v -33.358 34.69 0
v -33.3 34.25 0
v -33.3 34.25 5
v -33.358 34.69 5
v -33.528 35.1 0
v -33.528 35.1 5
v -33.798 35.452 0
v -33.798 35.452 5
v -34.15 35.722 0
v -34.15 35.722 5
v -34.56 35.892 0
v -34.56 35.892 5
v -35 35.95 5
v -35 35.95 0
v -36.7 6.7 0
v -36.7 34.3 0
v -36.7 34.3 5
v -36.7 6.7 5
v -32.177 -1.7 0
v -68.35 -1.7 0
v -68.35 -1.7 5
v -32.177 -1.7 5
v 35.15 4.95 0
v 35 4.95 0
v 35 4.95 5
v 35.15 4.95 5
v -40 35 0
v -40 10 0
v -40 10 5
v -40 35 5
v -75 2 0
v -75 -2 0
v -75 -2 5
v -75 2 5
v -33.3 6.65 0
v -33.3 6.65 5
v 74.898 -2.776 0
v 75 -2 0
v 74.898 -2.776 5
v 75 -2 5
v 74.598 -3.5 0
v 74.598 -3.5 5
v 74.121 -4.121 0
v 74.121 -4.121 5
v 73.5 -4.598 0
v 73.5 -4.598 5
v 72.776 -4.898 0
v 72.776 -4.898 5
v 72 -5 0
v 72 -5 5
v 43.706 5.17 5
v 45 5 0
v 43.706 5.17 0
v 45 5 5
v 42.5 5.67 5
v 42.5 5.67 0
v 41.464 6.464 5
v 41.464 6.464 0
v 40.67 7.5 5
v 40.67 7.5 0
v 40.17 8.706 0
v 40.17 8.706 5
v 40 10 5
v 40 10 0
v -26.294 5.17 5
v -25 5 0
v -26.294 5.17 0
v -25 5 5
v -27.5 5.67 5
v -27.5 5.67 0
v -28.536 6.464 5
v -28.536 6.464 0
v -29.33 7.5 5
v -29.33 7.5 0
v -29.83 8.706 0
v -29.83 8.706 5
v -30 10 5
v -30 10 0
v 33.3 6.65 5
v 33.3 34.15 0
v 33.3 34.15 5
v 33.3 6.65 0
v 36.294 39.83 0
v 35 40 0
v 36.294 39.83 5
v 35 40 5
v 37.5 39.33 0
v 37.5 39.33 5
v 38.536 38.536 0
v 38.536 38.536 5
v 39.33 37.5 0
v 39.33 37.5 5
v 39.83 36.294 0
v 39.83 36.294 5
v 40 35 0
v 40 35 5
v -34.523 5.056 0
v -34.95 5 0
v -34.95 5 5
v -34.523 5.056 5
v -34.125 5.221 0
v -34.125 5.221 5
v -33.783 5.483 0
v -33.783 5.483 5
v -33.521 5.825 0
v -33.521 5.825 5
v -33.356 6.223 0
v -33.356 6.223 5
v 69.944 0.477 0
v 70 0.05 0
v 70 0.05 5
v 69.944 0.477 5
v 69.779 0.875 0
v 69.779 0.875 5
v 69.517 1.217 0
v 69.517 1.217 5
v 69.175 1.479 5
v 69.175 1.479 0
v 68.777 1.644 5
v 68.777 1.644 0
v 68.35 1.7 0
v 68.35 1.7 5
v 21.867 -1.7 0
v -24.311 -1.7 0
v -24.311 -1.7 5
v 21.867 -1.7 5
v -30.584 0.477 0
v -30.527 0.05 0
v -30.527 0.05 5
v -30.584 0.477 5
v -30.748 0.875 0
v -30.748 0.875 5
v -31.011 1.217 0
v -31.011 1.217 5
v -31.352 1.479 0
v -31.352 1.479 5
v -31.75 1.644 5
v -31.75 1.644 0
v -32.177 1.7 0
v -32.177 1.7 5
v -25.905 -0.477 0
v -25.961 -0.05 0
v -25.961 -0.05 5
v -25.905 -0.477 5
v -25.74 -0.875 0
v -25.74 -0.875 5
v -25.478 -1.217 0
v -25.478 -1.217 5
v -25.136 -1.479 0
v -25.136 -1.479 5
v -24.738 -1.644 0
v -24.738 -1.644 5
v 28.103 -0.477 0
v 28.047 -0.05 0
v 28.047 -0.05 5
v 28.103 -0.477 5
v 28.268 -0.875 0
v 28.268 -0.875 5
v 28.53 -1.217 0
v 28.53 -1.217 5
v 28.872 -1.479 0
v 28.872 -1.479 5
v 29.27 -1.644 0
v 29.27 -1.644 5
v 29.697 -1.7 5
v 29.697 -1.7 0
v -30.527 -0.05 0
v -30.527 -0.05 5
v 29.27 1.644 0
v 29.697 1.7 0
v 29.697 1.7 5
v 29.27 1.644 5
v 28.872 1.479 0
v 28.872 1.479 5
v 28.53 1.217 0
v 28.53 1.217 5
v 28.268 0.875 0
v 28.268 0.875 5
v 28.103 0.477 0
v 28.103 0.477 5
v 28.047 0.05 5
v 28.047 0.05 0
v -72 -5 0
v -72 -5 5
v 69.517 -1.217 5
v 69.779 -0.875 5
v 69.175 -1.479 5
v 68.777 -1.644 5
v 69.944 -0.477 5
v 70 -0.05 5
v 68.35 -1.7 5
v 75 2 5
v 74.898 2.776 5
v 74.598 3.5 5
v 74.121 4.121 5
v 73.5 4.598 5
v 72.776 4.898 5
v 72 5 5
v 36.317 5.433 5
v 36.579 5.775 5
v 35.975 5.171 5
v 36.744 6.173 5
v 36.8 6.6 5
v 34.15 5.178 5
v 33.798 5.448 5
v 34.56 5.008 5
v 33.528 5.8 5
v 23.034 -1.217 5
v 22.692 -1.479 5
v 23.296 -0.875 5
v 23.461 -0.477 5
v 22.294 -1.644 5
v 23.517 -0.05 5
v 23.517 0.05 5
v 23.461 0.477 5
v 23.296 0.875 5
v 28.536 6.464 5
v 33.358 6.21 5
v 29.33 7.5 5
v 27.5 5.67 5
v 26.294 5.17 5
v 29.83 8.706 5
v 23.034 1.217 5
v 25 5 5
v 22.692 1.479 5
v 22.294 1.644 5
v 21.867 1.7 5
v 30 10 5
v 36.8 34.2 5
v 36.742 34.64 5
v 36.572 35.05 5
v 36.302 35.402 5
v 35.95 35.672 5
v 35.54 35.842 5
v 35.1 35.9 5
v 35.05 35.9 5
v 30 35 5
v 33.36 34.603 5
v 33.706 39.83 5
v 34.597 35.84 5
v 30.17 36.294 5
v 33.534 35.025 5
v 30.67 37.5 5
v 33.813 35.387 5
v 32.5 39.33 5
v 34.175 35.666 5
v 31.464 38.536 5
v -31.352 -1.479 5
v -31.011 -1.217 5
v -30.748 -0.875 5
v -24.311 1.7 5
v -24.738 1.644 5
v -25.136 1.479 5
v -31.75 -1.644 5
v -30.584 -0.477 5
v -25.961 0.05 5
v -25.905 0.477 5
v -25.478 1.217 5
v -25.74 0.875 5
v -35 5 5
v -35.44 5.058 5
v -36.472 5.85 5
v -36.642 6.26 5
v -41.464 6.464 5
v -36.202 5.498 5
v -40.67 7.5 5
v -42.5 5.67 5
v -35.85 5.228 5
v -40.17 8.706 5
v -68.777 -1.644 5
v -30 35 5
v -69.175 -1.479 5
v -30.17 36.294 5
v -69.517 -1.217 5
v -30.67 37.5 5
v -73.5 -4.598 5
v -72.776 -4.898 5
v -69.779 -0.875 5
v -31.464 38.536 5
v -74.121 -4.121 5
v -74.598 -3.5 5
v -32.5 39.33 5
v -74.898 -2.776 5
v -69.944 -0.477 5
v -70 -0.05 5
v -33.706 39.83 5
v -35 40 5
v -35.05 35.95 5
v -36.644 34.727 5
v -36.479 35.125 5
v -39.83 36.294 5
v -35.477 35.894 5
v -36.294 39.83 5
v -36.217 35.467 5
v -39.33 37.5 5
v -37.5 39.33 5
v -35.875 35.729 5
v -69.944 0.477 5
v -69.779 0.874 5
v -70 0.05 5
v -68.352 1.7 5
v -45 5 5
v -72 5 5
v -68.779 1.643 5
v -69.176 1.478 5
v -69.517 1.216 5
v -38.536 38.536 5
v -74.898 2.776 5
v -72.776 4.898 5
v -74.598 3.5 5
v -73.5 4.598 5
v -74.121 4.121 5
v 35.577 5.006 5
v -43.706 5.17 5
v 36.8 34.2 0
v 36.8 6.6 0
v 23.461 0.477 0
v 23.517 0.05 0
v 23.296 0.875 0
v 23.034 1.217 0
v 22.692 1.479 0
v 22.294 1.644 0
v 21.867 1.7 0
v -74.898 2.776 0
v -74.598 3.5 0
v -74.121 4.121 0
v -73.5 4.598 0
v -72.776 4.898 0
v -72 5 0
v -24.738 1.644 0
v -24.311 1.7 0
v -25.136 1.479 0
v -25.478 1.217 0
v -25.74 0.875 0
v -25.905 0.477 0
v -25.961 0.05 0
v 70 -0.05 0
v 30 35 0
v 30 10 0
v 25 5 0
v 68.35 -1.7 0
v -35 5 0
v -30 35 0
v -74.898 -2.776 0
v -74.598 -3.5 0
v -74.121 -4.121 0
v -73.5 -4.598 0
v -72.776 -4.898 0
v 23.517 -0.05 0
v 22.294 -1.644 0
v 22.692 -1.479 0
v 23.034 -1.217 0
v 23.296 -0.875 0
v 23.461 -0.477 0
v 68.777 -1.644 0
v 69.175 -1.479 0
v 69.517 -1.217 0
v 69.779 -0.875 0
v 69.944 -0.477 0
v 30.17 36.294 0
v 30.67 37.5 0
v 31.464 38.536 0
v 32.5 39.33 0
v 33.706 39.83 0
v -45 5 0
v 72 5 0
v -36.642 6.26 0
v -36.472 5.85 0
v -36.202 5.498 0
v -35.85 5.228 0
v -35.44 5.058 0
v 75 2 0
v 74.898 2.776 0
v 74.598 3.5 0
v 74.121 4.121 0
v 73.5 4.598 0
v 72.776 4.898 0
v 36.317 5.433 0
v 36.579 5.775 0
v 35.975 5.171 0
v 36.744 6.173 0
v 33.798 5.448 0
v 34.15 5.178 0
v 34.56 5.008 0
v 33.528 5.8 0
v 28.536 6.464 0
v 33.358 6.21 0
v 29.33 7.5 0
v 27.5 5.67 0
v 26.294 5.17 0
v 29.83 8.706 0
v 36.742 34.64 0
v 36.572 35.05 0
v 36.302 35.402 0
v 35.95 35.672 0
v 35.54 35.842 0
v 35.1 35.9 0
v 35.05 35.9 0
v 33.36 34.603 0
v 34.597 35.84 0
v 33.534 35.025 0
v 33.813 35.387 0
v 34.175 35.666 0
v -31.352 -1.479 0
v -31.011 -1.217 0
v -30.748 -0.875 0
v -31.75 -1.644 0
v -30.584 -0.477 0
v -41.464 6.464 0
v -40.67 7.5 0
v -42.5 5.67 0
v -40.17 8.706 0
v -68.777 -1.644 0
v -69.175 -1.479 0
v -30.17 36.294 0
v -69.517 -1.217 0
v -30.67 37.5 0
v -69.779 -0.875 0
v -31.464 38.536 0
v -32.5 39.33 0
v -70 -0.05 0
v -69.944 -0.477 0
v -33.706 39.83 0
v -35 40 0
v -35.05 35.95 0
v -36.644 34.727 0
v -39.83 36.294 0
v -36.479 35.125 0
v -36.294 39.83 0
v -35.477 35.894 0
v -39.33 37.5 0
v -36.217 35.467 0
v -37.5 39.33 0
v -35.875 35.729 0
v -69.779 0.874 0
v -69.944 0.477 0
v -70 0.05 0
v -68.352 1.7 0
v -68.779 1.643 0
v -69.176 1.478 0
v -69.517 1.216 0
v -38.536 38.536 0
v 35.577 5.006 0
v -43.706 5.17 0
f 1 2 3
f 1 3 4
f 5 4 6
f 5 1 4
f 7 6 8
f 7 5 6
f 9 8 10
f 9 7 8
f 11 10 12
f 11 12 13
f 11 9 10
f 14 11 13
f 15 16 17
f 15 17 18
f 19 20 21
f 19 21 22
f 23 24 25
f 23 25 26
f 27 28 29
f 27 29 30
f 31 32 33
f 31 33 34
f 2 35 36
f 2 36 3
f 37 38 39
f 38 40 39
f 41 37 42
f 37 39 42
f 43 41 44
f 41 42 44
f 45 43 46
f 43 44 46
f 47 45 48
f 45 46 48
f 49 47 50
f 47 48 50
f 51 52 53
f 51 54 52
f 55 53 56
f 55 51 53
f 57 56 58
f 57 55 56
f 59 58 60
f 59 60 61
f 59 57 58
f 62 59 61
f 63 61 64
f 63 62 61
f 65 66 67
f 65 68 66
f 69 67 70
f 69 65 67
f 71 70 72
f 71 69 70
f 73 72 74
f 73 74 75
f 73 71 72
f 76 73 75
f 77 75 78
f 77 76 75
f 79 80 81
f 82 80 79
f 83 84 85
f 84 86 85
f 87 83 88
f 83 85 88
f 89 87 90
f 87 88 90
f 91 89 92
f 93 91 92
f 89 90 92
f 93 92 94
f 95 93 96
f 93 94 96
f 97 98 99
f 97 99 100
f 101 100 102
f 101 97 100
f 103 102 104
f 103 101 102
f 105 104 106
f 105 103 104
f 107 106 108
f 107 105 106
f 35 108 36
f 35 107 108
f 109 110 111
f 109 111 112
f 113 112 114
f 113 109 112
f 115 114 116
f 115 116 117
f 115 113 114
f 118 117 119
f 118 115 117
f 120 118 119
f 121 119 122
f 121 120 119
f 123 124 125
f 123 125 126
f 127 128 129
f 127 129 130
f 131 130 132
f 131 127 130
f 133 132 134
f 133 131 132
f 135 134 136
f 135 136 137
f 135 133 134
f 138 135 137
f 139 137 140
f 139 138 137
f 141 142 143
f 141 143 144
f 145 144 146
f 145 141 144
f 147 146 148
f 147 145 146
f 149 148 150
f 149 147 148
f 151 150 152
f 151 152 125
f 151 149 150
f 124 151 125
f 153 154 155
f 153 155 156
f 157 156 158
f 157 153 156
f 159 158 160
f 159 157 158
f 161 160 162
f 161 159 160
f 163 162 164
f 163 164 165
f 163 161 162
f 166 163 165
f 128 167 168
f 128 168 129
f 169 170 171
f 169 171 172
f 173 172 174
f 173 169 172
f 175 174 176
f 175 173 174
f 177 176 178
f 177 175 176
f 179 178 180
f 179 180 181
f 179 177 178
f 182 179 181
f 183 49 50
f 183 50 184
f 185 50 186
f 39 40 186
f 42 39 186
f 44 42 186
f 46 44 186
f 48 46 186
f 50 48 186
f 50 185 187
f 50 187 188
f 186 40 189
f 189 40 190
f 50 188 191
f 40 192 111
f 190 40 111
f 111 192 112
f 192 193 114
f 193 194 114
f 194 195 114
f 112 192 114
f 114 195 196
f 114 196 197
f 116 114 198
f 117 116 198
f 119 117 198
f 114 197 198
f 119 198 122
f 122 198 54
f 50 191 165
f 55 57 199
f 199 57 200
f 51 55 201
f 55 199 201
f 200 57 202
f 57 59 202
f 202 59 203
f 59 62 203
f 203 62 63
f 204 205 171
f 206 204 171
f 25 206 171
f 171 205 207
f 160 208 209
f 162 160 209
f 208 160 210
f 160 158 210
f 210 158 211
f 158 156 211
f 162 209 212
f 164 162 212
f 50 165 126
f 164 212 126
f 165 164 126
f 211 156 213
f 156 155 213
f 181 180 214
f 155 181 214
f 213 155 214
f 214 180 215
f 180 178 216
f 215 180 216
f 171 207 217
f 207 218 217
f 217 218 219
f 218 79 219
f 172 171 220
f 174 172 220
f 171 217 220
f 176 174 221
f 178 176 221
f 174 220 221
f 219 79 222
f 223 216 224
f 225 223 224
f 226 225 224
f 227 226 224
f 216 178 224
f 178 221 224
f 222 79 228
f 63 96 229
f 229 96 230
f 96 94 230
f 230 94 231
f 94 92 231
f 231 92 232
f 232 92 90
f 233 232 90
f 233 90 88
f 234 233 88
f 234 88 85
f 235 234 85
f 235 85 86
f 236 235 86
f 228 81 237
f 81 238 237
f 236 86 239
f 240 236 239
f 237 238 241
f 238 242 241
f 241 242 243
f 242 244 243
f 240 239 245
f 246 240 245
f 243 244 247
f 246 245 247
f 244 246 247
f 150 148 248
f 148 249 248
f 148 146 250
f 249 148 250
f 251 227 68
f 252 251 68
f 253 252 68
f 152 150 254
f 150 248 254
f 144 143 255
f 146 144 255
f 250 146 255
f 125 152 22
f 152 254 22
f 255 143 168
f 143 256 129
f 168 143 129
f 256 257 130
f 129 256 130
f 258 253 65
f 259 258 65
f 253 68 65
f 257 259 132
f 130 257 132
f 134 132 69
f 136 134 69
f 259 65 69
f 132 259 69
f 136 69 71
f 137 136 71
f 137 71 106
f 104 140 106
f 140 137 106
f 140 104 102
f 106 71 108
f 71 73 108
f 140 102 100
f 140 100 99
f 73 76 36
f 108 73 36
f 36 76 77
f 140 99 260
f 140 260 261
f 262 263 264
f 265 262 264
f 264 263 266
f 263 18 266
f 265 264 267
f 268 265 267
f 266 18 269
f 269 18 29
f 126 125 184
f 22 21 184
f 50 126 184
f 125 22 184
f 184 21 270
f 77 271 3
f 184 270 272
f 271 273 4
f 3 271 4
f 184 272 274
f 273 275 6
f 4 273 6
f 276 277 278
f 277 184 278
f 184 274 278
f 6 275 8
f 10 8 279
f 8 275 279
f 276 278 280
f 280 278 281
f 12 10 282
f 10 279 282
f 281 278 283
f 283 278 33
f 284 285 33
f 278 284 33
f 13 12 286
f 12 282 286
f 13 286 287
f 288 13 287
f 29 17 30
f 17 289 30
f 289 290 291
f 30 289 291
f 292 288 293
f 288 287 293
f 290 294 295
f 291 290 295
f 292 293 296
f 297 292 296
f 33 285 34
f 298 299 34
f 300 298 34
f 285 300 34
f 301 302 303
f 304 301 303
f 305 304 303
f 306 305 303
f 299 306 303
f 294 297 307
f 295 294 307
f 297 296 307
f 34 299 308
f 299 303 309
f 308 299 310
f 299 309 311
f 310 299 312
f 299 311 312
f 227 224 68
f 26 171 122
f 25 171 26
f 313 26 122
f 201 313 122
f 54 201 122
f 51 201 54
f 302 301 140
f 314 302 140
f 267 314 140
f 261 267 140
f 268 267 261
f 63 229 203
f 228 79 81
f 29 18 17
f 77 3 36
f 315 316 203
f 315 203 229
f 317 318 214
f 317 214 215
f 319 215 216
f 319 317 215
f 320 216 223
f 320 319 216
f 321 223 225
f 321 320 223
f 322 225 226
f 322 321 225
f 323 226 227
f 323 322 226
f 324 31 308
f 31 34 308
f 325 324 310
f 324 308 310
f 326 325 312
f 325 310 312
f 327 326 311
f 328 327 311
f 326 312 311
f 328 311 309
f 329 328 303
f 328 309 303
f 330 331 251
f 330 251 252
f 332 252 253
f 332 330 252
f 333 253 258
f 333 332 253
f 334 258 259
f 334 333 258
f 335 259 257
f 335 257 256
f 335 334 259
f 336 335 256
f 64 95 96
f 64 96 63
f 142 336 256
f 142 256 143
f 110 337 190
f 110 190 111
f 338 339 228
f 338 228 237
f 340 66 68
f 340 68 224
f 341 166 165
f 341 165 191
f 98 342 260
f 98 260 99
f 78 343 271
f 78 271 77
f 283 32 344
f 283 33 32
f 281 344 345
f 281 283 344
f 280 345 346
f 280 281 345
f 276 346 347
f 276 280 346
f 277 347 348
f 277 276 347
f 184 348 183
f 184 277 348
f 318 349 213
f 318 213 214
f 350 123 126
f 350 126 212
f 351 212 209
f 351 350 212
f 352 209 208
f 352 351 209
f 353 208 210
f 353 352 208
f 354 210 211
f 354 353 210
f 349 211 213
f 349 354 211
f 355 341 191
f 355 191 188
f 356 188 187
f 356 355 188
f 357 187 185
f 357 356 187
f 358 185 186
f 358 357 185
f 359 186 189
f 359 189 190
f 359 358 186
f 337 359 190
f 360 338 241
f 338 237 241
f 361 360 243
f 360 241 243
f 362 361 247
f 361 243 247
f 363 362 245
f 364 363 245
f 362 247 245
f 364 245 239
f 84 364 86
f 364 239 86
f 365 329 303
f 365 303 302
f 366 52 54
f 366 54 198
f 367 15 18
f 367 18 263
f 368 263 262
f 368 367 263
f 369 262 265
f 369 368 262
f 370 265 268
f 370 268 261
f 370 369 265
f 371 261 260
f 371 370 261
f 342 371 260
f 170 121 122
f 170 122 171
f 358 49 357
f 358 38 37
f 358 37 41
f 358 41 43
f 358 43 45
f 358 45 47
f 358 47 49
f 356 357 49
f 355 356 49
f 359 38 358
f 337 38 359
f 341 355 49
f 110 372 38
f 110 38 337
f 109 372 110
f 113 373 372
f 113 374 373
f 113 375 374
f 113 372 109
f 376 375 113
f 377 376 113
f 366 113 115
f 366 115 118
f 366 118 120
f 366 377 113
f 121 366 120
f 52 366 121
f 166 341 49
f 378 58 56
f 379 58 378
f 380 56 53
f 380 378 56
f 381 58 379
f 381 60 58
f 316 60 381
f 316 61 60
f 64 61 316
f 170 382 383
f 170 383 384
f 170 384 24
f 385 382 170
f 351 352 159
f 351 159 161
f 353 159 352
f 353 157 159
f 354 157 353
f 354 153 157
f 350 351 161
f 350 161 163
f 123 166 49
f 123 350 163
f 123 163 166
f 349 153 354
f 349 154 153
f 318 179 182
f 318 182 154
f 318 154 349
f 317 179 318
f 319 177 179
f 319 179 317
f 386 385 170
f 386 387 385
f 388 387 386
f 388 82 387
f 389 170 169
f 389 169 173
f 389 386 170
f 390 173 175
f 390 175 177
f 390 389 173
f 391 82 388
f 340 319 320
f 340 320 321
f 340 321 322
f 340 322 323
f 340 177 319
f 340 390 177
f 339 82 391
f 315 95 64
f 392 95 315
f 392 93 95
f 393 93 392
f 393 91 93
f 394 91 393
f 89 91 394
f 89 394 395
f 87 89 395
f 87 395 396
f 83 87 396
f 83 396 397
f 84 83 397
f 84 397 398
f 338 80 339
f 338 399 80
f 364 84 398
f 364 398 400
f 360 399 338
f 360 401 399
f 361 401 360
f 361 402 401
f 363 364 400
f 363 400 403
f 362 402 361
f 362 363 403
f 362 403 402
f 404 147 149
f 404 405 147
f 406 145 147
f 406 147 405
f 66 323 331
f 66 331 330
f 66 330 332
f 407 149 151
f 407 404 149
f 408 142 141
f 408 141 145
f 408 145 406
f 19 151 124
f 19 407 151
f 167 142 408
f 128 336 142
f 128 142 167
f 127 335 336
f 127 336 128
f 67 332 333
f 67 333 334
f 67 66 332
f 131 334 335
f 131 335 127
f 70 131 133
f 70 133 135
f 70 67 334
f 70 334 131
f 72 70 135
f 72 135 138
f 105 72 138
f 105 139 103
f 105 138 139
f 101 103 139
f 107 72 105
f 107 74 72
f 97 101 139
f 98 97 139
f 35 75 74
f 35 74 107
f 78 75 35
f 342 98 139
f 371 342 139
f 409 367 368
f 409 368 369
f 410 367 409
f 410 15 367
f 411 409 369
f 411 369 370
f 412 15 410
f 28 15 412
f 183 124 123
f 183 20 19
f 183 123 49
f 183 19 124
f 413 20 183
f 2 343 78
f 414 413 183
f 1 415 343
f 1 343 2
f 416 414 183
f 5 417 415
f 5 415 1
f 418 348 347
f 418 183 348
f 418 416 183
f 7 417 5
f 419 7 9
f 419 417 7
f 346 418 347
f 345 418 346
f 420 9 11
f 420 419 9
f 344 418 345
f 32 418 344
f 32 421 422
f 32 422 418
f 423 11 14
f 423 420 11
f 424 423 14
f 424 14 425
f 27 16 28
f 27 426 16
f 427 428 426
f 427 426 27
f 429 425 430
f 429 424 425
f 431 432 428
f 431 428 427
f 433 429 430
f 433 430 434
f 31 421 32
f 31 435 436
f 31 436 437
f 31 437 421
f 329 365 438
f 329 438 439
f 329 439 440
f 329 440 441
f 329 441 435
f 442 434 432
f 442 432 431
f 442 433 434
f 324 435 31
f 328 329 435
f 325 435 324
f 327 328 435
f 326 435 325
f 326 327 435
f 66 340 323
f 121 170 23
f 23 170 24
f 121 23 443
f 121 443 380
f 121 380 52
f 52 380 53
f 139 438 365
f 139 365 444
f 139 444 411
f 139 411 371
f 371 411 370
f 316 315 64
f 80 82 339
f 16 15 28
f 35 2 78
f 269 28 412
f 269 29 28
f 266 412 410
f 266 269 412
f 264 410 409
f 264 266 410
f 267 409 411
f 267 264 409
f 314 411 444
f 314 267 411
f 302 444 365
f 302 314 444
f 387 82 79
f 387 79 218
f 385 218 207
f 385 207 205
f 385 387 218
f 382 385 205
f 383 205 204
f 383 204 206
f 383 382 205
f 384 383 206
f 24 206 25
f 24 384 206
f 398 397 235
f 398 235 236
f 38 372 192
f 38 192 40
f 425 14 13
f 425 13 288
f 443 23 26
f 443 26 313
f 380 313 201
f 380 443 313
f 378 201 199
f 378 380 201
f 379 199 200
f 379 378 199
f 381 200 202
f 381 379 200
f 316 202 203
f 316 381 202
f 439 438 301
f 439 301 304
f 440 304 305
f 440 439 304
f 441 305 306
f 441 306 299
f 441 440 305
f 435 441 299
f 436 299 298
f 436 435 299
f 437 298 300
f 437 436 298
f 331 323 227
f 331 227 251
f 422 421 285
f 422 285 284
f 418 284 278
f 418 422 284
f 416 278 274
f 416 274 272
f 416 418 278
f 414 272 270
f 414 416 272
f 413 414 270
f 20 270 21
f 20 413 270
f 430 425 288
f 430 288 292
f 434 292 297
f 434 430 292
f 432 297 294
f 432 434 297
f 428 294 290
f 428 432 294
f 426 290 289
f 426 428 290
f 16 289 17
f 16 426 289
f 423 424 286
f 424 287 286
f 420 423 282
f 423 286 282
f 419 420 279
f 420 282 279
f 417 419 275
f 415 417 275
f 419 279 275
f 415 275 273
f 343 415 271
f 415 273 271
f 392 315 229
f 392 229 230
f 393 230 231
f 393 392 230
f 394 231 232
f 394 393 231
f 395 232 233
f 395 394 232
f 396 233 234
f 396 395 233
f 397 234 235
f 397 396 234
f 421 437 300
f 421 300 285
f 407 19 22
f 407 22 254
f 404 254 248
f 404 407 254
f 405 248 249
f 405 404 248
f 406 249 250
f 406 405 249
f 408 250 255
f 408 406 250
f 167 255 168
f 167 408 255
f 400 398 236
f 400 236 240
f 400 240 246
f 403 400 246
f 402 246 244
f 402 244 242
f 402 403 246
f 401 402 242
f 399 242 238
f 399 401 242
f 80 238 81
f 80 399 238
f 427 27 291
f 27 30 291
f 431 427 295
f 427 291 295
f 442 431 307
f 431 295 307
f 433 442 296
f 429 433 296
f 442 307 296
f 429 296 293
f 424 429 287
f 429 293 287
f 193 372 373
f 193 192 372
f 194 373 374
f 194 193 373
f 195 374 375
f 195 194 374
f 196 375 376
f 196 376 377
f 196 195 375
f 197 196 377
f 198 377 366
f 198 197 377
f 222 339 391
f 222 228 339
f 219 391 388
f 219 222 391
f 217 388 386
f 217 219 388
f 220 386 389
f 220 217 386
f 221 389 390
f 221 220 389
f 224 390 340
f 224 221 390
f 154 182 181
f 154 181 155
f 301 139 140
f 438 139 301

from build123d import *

# Parameters (mm, degrees)
EXTRUDE_1_DEPTH     = 5
FILLET_4_R          = 5
FILLET_5_R          = 5
FILLET_6_R          = 5
FILLET_7_R          = 5
FILLET_8_R          = 3
FILLET_9_R          = 3
FILLET_10_R         = 3
FILLET_11_R         = 3
FILLET_12_R         = 5
FILLET_13_R         = 5
FILLET_14_R         = 5
FILLET_15_R         = 5
CUT_EXTRUDE_START   = -5
CUT_EXTRUDE_2_DEPTH = 5


# Read off the part's stored shape, not the designer's step: 切除-拉伸2
with BuildPart() as part:
    # 草图1 → 凸台-拉伸1 (new body)
    with BuildSketch(Plane.XY):
        Polygon((-75, 5), (-40, 5), (-40, 40), (-30, 40), (-30, 5), (30, 5), (30, 40), (40, 40), (40, 5), (75, 5), (75, -5), (-75, -5), align=None)
    extrude(amount=EXTRUDE_1_DEPTH)

    # 圆角4
    fillet_4_edges = [part.edges().sort_by_distance(p)[0] for p in [
        (-40, 40, 2.5),
    ]]
    fillet(fillet_4_edges, radius=FILLET_4_R)

    # 圆角5
    fillet_5_edges = [part.edges().sort_by_distance(p)[0] for p in [
        (-30, 40, 2.5),
    ]]
    fillet(fillet_5_edges, radius=FILLET_5_R - 0.0001)  # a hair under: the kernel refuses the full size

    # 圆角6
    fillet_6_edges = [part.edges().sort_by_distance(p)[0] for p in [
        (30, 40, 2.5),
    ]]
    fillet(fillet_6_edges, radius=FILLET_6_R)

    # 圆角7
    fillet_7_edges = [part.edges().sort_by_distance(p)[0] for p in [
        (40, 40, 2.5),
    ]]
    fillet(fillet_7_edges, radius=FILLET_7_R - 0.0001)  # a hair under: the kernel refuses the full size

    # 圆角8
    fillet_8_edges = [part.edges().sort_by_distance(p)[0] for p in [
        (-75, 5, 2.5),
    ]]
    fillet(fillet_8_edges, radius=FILLET_8_R)

    # 圆角9
    fillet_9_edges = [part.edges().sort_by_distance(p)[0] for p in [
        (-75, -5, 2.5),
    ]]
    fillet(fillet_9_edges, radius=FILLET_9_R)

    # 圆角10
    fillet_10_edges = [part.edges().sort_by_distance(p)[0] for p in [
        (75, 5, 2.5),
    ]]
    fillet(fillet_10_edges, radius=FILLET_10_R)

    # 圆角11
    fillet_11_edges = [part.edges().sort_by_distance(p)[0] for p in [
        (75, -5, 2.5),
    ]]
    fillet(fillet_11_edges, radius=FILLET_11_R)

    # 圆角12
    fillet_12_edges = [part.edges().sort_by_distance(p)[0] for p in [
        (40, 5, 2.5),
    ]]
    fillet(fillet_12_edges, radius=FILLET_12_R)

    # 圆角13
    fillet_13_edges = [part.edges().sort_by_distance(p)[0] for p in [
        (30, 5, 2.5),
    ]]
    fillet(fillet_13_edges, radius=FILLET_13_R)

    # 圆角14
    fillet_14_edges = [part.edges().sort_by_distance(p)[0] for p in [
        (-30, 5, 2.5),
    ]]
    fillet(fillet_14_edges, radius=FILLET_14_R)

    # 圆角15
    fillet_15_edges = [part.edges().sort_by_distance(p)[0] for p in [
        (-40, 5, 2.5),
    ]]
    fillet(fillet_15_edges, radius=FILLET_15_R)

    # 切除-拉伸2 outline → 切除-拉伸2 (cut)
    with BuildSketch(Plane.XY.offset(5).offset(CUT_EXTRUDE_START)):
        with BuildLine():
            ThreePointArc((-36.7, 6.7), (-36.202081528, 5.497918472), (-35, 5))
            Line((-35, 5), (-34.95, 5))
            ThreePointArc((-34.95, 5), (-33.783273811, 5.483273811), (-33.3, 6.65))
            Line((-33.3, 6.65), (-33.3, 34.25))
            ThreePointArc((-33.3, 34.25), (-33.797918472, 35.452081528), (-35, 35.95))
            Line((-35, 35.95), (-35.05, 35.95))
            ThreePointArc((-35.05, 35.95), (-36.216726189, 35.466726189), (-36.7, 34.3))
            Line((-36.7, 34.3), (-36.7, 6.7))
        make_face()
        with BuildLine():
            Line((-30.527301477, -0.05), (-30.527301477, 0.05))
            ThreePointArc((-30.527301477, 0.05), (-31.010575288, 1.216726189), (-32.177301477, 1.7))
            Line((-32.177301477, 1.7), (-68.351867054, 1.699998944))
            ThreePointArc((-68.351867054, 1.699998944), (-69.517386106, 1.216065899), (-70, 0.05))
            Line((-70, 0.05), (-70, -0.05))
            ThreePointArc((-70, -0.05), (-69.516726189, -1.216726189), (-68.35, -1.7))
            Line((-68.35, -1.7), (-32.177301477, -1.7))
            ThreePointArc((-32.177301477, -1.7), (-31.010575288, -1.216726189), (-30.527301477, -0.05))
        make_face()
        with BuildLine():
            Line((-24.310810244, -1.7), (21.867276161, -1.7))
            ThreePointArc((21.867276161, -1.7), (23.03400235, -1.216726189), (23.517276161, -0.05))
            Line((23.517276161, -0.05), (23.517276161, 0.05))
            ThreePointArc((23.517276161, 0.05), (23.03400235, 1.216726189), (21.867276161, 1.7))
            Line((21.867276161, 1.7), (-24.310810244, 1.7))
            ThreePointArc((-24.310810244, 1.7), (-25.477536433, 1.216726189), (-25.960810244, 0.05))
            Line((-25.960810244, 0.05), (-25.960810244, -0.05))
            ThreePointArc((-25.960810244, -0.05), (-25.477536433, -1.216726189), (-24.310810244, -1.7))
        make_face()
        with BuildLine():
            Line((29.696775282, -1.7), (68.35, -1.7))
            ThreePointArc((68.35, -1.7), (69.516726189, -1.216726189), (70, -0.05))
            Line((70, -0.05), (70, 0.05))
            ThreePointArc((70, 0.05), (69.516726189, 1.216726189), (68.35, 1.7))
            Line((68.35, 1.7), (29.696775282, 1.7))
            ThreePointArc((29.696775282, 1.7), (28.530049093, 1.216726189), (28.046775282, 0.05))
            Line((28.046775282, 0.05), (28.046775282, -0.05))
            ThreePointArc((28.046775282, -0.05), (28.530049093, -1.216726189), (29.696775282, -1.7))
        make_face()
        with BuildLine():
            ThreePointArc((36.800022997, 34.2), (36.302104525, 35.402081528), (35.100022997, 35.9))
            Line((35.100022997, 35.9), (35.050022997, 35.9))
            ThreePointArc((35.050022997, 35.9), (33.812569868, 35.387430132), (33.3, 34.149977003))
            Line((33.3, 34.149977003), (33.3, 6.65))
            ThreePointArc((33.3, 6.65), (33.797918472, 5.447918472), (35, 4.95))
            Line((35, 4.95), (35.150022997, 4.95))
            ThreePointArc((35.150022997, 4.95), (36.316749186, 5.433273812), (36.800022997, 6.6))
            Line((36.800022997, 6.6), (36.800022997, 34.2))
        make_face()
    extrude(amount=CUT_EXTRUDE_2_DEPTH, mode=Mode.SUBTRACT)


solid = part.part
